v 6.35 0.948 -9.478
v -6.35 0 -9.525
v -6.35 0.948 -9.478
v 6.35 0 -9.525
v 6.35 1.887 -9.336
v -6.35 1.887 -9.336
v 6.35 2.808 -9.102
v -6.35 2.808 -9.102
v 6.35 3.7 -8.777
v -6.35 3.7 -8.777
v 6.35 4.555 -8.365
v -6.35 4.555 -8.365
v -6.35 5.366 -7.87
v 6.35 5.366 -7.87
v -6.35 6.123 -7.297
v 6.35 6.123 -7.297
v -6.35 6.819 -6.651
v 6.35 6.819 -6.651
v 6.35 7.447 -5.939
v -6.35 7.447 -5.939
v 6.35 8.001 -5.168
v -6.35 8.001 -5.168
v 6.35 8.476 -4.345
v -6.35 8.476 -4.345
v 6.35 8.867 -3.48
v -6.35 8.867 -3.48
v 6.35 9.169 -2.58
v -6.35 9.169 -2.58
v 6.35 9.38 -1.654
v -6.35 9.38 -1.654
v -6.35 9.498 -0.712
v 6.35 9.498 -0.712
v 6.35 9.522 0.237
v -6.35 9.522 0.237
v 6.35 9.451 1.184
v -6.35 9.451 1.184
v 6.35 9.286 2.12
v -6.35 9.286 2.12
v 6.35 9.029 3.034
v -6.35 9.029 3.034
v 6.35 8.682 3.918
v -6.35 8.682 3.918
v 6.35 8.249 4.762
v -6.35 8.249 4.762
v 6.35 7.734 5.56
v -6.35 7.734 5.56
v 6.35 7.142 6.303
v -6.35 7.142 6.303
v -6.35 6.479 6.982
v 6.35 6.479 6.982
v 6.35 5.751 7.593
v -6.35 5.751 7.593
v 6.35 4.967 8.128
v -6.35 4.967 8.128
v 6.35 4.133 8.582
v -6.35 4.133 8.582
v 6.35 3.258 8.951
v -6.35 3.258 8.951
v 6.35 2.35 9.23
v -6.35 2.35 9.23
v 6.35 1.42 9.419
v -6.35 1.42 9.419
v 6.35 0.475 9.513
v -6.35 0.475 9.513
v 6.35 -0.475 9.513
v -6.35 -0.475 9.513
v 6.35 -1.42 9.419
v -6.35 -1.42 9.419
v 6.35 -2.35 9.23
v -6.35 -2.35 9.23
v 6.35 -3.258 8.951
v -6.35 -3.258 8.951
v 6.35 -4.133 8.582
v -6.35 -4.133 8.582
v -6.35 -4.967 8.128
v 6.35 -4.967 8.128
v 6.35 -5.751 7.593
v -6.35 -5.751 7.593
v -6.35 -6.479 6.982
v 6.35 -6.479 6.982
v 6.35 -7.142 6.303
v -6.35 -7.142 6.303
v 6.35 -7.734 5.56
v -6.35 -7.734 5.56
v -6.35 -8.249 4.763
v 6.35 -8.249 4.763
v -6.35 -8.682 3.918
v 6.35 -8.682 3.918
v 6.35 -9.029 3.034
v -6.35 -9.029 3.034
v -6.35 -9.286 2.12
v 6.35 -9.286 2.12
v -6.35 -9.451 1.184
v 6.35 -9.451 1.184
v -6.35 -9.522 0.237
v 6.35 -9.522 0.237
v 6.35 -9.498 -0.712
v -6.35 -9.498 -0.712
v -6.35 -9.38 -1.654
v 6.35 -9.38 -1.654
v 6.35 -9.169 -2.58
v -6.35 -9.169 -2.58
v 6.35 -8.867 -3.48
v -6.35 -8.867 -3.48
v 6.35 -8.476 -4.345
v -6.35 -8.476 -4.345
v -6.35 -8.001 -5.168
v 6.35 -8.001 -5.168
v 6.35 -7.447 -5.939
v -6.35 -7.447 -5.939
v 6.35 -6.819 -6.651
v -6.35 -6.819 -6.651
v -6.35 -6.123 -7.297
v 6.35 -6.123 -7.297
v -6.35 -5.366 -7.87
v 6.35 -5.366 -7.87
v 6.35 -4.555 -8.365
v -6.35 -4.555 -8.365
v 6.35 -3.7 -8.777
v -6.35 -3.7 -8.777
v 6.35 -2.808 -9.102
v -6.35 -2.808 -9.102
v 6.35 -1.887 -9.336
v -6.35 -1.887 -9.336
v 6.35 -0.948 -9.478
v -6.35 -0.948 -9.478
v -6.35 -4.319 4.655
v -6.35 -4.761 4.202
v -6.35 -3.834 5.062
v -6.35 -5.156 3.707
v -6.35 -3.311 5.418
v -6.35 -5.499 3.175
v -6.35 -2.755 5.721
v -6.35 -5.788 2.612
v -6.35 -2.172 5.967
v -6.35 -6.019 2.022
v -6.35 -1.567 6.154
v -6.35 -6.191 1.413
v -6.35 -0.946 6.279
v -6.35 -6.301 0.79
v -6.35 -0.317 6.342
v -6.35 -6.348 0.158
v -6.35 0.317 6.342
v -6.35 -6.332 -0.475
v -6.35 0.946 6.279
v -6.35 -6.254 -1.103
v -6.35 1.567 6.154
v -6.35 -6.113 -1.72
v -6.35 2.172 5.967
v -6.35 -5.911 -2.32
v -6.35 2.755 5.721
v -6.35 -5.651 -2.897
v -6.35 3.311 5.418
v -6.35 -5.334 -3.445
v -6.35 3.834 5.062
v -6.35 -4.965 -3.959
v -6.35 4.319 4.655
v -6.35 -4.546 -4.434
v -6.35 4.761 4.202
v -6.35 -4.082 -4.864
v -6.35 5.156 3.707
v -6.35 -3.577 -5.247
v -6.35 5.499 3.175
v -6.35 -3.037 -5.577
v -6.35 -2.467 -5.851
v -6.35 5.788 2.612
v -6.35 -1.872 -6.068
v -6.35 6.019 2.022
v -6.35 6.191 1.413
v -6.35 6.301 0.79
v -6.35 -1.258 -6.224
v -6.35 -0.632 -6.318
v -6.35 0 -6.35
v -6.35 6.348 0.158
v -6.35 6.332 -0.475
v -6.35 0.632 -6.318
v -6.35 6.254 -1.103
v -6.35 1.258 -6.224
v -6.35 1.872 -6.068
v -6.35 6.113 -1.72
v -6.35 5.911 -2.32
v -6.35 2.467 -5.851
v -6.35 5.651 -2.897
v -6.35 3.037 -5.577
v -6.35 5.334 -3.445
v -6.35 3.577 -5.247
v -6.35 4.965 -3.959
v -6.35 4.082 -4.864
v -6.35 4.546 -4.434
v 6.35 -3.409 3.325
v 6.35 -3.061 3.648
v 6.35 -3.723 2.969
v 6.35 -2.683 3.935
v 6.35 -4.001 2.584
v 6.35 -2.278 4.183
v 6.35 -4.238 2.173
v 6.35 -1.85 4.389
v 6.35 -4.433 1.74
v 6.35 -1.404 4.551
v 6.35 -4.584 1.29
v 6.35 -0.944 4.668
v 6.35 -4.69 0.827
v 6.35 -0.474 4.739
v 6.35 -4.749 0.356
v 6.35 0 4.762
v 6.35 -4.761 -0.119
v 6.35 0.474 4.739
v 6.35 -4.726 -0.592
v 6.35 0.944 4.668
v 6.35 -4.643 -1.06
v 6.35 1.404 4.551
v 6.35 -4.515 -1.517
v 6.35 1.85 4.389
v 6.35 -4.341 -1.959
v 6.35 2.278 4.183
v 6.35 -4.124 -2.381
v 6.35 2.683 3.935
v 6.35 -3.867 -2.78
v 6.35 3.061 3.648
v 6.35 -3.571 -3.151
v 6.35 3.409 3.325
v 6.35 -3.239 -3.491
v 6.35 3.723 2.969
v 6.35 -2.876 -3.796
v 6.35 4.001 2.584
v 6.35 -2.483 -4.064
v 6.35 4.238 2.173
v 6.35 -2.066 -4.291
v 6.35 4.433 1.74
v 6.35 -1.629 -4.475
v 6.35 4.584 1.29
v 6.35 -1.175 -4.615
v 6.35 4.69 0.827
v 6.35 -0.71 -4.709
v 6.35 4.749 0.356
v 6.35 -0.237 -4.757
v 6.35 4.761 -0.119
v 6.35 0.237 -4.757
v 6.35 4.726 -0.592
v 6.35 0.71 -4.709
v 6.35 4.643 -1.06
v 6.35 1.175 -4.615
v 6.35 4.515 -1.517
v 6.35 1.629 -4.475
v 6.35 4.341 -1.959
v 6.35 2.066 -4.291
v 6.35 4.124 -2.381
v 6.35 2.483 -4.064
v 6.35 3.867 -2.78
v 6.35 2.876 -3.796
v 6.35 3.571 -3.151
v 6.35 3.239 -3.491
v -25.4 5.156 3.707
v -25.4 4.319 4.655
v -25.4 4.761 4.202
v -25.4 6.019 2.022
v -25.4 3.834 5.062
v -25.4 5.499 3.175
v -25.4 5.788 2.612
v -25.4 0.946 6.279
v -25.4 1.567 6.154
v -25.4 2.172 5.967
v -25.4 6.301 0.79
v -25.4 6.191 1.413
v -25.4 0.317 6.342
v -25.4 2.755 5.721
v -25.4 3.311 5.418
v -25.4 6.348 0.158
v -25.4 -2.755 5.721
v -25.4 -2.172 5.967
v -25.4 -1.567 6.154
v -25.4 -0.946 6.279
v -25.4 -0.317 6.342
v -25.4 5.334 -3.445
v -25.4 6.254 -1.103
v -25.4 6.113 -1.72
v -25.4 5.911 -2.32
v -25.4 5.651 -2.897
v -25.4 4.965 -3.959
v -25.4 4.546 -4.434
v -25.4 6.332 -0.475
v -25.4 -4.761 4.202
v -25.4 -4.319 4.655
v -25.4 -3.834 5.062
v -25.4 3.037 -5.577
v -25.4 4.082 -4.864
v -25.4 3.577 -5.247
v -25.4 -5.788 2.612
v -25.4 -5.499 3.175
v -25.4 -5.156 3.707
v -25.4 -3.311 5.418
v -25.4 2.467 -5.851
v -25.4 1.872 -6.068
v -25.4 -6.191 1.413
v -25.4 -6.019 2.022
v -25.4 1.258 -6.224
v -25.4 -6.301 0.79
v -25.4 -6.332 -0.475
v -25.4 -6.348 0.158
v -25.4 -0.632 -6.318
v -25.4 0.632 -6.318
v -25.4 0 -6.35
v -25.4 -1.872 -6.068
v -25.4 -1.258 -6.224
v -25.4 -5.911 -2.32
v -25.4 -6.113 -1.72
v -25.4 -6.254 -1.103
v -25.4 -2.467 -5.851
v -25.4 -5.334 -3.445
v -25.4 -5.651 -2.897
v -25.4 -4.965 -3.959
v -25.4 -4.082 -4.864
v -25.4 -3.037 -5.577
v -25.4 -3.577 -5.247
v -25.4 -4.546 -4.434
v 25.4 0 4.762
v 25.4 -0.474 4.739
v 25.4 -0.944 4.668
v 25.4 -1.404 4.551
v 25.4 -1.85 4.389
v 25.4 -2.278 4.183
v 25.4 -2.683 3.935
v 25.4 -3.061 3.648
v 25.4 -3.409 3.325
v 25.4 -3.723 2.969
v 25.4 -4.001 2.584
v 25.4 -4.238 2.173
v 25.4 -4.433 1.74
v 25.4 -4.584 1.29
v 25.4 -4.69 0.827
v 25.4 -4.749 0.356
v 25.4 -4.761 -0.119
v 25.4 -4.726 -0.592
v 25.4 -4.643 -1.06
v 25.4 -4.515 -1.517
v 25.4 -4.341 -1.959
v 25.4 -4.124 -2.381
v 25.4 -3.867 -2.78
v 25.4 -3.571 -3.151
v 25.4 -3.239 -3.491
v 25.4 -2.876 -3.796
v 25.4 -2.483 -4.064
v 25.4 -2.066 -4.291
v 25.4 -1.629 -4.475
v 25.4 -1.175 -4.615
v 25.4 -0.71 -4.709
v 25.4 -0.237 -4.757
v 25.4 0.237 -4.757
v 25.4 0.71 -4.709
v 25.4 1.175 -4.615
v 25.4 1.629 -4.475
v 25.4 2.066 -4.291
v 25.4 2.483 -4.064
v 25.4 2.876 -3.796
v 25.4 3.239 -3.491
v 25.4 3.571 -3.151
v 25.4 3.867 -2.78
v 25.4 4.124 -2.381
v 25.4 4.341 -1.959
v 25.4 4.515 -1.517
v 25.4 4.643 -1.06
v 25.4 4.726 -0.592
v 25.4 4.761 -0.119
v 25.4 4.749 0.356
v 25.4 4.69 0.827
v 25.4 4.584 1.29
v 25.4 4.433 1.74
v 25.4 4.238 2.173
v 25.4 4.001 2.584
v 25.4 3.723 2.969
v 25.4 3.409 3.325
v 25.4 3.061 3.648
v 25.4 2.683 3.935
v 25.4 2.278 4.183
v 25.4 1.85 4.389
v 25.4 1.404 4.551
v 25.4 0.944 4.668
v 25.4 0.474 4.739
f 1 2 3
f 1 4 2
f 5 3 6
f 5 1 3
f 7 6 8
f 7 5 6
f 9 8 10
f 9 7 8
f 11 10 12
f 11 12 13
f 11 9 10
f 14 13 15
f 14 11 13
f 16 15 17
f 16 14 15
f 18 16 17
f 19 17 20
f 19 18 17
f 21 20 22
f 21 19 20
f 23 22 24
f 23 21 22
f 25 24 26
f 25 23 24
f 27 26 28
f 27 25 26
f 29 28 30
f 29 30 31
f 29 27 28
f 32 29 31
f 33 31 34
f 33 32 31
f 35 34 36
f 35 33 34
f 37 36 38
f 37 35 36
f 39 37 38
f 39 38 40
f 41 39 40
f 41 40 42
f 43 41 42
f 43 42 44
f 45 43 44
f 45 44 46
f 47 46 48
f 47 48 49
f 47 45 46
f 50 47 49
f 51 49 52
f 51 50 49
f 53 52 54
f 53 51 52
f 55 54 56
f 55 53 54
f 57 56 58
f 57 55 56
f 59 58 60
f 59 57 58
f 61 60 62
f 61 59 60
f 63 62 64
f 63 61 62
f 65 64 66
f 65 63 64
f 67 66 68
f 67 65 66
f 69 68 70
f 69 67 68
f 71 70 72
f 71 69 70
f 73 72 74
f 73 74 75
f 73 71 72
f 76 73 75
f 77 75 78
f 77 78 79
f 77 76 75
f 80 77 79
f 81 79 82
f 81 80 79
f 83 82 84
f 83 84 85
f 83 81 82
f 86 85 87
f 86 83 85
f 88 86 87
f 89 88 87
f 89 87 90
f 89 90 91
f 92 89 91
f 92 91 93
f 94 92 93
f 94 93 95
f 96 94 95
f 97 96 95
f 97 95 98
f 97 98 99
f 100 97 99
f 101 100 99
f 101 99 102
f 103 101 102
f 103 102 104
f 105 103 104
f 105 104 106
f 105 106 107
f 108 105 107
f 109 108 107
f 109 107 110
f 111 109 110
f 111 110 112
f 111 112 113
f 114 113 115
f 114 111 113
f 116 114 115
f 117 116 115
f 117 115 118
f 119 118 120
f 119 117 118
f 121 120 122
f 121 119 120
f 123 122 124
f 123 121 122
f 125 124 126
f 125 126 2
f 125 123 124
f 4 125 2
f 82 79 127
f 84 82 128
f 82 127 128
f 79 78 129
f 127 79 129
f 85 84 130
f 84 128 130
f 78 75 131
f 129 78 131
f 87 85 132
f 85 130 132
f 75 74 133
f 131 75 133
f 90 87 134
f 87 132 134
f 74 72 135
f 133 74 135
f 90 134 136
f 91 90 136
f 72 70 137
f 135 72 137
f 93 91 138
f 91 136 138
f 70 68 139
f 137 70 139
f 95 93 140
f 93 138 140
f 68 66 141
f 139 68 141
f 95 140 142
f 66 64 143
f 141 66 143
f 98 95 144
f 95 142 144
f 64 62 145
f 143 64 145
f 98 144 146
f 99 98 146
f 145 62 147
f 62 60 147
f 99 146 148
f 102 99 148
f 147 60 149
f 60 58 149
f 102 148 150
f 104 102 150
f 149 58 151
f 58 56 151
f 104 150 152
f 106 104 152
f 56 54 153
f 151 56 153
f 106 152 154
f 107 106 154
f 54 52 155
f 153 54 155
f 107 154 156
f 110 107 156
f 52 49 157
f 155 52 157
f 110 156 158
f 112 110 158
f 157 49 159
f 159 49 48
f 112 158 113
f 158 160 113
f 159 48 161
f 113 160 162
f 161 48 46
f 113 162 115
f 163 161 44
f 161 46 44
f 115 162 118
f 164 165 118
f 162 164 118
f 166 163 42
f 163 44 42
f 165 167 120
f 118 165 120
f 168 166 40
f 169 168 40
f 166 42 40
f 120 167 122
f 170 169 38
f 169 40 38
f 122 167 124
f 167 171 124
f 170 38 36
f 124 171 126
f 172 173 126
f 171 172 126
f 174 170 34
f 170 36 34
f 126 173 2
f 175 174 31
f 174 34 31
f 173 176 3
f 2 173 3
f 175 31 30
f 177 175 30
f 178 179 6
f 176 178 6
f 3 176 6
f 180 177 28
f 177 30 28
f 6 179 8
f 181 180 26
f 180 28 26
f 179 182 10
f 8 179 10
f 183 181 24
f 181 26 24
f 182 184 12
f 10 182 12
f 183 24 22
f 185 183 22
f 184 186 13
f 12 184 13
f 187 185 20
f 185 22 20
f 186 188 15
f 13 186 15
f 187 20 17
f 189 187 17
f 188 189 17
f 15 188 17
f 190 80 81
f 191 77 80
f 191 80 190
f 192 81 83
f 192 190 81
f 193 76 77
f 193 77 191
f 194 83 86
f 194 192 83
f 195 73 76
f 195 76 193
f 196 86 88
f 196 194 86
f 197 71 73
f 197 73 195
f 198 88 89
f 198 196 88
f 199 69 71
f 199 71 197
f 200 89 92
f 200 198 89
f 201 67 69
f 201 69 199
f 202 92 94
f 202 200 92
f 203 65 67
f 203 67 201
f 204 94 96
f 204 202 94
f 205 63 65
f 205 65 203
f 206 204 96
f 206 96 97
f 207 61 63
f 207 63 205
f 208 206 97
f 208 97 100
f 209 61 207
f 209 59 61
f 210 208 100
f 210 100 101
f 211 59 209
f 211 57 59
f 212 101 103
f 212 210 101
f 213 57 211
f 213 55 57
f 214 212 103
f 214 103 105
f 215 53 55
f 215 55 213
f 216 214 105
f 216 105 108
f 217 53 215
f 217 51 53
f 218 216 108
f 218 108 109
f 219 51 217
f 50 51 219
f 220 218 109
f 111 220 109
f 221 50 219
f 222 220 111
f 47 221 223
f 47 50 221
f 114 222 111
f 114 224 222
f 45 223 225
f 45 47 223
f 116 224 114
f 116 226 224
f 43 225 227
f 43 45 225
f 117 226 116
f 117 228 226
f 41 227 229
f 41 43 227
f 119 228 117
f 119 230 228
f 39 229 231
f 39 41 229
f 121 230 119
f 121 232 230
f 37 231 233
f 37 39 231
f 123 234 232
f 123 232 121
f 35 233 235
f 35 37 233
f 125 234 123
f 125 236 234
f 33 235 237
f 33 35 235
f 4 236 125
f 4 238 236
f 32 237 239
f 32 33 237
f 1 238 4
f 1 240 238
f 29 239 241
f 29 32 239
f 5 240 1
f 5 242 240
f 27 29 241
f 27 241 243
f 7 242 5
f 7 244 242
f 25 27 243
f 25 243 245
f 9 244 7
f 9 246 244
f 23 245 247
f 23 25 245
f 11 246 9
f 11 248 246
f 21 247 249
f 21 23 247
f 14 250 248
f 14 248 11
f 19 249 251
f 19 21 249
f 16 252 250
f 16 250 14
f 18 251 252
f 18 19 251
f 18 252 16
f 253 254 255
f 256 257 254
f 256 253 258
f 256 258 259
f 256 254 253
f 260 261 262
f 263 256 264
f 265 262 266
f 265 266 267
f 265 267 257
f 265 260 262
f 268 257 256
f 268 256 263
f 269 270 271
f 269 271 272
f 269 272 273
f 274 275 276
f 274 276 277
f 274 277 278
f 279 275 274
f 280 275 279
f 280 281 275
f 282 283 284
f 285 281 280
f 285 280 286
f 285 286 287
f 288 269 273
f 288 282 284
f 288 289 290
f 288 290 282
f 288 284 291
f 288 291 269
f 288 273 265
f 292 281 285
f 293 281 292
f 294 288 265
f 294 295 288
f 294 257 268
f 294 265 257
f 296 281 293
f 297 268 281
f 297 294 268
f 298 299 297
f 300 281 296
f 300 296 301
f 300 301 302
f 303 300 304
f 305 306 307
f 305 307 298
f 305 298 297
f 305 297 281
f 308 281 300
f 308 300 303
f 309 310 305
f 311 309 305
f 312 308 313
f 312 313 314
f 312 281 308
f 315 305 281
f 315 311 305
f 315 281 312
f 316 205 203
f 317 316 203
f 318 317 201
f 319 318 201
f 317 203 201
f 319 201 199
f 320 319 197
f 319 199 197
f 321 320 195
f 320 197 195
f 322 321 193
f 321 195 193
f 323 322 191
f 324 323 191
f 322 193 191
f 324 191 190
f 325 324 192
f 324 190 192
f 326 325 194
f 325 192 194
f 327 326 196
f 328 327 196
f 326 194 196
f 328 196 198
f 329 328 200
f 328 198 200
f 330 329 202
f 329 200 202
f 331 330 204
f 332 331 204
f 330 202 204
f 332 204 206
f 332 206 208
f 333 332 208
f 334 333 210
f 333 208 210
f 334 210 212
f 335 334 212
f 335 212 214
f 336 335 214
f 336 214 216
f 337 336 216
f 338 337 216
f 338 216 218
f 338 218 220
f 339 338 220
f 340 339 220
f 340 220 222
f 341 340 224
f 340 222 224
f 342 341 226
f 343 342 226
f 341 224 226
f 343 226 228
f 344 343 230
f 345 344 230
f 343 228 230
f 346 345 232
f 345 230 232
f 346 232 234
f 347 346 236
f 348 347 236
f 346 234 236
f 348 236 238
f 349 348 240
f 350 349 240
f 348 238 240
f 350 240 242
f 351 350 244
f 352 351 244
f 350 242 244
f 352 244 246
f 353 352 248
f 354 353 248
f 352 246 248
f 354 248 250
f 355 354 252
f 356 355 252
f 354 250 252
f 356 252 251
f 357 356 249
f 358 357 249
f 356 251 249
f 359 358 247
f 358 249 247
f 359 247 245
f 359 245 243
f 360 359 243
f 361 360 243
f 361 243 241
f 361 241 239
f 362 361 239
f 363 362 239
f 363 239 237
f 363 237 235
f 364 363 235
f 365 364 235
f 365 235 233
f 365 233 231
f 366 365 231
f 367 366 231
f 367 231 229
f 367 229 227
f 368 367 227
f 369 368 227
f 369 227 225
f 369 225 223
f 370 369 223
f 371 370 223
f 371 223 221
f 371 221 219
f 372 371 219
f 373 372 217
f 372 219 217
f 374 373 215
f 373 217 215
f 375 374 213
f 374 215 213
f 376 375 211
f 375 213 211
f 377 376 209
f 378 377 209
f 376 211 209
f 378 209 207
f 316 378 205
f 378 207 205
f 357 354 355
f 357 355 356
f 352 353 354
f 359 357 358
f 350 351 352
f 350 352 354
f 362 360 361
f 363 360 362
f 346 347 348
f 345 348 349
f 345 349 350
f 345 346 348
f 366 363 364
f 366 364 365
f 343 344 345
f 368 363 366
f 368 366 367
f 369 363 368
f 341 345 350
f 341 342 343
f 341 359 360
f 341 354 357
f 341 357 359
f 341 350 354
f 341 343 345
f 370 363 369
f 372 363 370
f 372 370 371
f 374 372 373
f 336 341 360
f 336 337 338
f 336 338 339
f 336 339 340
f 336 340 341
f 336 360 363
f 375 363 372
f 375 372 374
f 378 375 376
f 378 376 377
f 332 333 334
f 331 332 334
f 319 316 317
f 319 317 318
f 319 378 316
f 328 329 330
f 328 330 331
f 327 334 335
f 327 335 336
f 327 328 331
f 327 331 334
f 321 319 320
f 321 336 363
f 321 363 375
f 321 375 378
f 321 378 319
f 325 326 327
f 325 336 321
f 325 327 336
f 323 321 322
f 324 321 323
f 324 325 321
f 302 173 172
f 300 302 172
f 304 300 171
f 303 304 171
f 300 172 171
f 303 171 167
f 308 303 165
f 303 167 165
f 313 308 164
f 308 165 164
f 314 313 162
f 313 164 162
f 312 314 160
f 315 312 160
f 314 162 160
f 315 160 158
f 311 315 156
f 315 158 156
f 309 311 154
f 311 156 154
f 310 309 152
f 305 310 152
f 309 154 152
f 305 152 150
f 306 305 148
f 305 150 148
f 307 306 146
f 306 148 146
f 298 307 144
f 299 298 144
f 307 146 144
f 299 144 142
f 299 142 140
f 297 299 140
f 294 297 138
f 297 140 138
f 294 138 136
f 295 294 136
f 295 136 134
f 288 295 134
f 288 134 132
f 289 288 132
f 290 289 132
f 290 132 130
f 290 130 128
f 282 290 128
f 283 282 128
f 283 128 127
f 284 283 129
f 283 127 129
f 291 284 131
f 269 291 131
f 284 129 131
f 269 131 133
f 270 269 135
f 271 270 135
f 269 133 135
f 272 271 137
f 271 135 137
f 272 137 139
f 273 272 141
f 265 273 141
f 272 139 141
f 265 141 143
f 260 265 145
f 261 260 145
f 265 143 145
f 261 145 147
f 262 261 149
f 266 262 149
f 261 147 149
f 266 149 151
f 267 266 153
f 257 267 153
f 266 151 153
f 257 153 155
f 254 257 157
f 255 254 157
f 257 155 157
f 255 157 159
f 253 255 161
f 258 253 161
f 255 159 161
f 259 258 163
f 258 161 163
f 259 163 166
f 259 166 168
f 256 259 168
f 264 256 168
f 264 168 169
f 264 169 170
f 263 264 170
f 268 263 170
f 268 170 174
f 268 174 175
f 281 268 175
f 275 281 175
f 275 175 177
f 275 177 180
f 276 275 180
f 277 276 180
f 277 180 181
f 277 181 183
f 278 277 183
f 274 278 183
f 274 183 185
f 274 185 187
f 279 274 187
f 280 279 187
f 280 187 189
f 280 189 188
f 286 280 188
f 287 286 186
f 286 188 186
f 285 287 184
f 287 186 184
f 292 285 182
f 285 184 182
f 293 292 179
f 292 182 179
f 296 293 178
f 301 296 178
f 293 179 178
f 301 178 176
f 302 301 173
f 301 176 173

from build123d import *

# Parameters (mm, degrees)
SKETCH1_R           = 9.525
BOSS_EXTRUDE1_DEPTH = 6.35
SKETCH2_R           = 4.7625
BOSS_EXTRUDE2_DEPTH = 19.05
SKETCH3_R           = 6.35
BOSS_EXTRUDE3_DEPTH = 19.05


with BuildPart() as part:
    # Sketch1 → Boss-Extrude1 (new, symmetric)
    with BuildSketch(Plane(origin=(0, 0, 0), x_dir=(0, 0, -1), z_dir=(1, 0, 0))):
        Circle(SKETCH1_R)
    extrude(amount=BOSS_EXTRUDE1_DEPTH, both=True)

    # Sketch2 → Boss-Extrude2 (add)
    with BuildSketch(Plane(origin=(6.35, 0, 0), x_dir=(0, 0, -1), z_dir=(1, 0, 0))):
        with Locations(Location((0, 0, 0), (0, 0, 180))):
            Circle(SKETCH2_R)
    extrude(amount=BOSS_EXTRUDE2_DEPTH)

    # Sketch3 → Boss-Extrude3 (add)
    with BuildSketch(Plane.ZY.offset(6.35)):
        with Locations(Location((0, 0, 0), (0, 0, 180))):
            Circle(SKETCH3_R)
    extrude(amount=BOSS_EXTRUDE3_DEPTH)


solid = part.part
